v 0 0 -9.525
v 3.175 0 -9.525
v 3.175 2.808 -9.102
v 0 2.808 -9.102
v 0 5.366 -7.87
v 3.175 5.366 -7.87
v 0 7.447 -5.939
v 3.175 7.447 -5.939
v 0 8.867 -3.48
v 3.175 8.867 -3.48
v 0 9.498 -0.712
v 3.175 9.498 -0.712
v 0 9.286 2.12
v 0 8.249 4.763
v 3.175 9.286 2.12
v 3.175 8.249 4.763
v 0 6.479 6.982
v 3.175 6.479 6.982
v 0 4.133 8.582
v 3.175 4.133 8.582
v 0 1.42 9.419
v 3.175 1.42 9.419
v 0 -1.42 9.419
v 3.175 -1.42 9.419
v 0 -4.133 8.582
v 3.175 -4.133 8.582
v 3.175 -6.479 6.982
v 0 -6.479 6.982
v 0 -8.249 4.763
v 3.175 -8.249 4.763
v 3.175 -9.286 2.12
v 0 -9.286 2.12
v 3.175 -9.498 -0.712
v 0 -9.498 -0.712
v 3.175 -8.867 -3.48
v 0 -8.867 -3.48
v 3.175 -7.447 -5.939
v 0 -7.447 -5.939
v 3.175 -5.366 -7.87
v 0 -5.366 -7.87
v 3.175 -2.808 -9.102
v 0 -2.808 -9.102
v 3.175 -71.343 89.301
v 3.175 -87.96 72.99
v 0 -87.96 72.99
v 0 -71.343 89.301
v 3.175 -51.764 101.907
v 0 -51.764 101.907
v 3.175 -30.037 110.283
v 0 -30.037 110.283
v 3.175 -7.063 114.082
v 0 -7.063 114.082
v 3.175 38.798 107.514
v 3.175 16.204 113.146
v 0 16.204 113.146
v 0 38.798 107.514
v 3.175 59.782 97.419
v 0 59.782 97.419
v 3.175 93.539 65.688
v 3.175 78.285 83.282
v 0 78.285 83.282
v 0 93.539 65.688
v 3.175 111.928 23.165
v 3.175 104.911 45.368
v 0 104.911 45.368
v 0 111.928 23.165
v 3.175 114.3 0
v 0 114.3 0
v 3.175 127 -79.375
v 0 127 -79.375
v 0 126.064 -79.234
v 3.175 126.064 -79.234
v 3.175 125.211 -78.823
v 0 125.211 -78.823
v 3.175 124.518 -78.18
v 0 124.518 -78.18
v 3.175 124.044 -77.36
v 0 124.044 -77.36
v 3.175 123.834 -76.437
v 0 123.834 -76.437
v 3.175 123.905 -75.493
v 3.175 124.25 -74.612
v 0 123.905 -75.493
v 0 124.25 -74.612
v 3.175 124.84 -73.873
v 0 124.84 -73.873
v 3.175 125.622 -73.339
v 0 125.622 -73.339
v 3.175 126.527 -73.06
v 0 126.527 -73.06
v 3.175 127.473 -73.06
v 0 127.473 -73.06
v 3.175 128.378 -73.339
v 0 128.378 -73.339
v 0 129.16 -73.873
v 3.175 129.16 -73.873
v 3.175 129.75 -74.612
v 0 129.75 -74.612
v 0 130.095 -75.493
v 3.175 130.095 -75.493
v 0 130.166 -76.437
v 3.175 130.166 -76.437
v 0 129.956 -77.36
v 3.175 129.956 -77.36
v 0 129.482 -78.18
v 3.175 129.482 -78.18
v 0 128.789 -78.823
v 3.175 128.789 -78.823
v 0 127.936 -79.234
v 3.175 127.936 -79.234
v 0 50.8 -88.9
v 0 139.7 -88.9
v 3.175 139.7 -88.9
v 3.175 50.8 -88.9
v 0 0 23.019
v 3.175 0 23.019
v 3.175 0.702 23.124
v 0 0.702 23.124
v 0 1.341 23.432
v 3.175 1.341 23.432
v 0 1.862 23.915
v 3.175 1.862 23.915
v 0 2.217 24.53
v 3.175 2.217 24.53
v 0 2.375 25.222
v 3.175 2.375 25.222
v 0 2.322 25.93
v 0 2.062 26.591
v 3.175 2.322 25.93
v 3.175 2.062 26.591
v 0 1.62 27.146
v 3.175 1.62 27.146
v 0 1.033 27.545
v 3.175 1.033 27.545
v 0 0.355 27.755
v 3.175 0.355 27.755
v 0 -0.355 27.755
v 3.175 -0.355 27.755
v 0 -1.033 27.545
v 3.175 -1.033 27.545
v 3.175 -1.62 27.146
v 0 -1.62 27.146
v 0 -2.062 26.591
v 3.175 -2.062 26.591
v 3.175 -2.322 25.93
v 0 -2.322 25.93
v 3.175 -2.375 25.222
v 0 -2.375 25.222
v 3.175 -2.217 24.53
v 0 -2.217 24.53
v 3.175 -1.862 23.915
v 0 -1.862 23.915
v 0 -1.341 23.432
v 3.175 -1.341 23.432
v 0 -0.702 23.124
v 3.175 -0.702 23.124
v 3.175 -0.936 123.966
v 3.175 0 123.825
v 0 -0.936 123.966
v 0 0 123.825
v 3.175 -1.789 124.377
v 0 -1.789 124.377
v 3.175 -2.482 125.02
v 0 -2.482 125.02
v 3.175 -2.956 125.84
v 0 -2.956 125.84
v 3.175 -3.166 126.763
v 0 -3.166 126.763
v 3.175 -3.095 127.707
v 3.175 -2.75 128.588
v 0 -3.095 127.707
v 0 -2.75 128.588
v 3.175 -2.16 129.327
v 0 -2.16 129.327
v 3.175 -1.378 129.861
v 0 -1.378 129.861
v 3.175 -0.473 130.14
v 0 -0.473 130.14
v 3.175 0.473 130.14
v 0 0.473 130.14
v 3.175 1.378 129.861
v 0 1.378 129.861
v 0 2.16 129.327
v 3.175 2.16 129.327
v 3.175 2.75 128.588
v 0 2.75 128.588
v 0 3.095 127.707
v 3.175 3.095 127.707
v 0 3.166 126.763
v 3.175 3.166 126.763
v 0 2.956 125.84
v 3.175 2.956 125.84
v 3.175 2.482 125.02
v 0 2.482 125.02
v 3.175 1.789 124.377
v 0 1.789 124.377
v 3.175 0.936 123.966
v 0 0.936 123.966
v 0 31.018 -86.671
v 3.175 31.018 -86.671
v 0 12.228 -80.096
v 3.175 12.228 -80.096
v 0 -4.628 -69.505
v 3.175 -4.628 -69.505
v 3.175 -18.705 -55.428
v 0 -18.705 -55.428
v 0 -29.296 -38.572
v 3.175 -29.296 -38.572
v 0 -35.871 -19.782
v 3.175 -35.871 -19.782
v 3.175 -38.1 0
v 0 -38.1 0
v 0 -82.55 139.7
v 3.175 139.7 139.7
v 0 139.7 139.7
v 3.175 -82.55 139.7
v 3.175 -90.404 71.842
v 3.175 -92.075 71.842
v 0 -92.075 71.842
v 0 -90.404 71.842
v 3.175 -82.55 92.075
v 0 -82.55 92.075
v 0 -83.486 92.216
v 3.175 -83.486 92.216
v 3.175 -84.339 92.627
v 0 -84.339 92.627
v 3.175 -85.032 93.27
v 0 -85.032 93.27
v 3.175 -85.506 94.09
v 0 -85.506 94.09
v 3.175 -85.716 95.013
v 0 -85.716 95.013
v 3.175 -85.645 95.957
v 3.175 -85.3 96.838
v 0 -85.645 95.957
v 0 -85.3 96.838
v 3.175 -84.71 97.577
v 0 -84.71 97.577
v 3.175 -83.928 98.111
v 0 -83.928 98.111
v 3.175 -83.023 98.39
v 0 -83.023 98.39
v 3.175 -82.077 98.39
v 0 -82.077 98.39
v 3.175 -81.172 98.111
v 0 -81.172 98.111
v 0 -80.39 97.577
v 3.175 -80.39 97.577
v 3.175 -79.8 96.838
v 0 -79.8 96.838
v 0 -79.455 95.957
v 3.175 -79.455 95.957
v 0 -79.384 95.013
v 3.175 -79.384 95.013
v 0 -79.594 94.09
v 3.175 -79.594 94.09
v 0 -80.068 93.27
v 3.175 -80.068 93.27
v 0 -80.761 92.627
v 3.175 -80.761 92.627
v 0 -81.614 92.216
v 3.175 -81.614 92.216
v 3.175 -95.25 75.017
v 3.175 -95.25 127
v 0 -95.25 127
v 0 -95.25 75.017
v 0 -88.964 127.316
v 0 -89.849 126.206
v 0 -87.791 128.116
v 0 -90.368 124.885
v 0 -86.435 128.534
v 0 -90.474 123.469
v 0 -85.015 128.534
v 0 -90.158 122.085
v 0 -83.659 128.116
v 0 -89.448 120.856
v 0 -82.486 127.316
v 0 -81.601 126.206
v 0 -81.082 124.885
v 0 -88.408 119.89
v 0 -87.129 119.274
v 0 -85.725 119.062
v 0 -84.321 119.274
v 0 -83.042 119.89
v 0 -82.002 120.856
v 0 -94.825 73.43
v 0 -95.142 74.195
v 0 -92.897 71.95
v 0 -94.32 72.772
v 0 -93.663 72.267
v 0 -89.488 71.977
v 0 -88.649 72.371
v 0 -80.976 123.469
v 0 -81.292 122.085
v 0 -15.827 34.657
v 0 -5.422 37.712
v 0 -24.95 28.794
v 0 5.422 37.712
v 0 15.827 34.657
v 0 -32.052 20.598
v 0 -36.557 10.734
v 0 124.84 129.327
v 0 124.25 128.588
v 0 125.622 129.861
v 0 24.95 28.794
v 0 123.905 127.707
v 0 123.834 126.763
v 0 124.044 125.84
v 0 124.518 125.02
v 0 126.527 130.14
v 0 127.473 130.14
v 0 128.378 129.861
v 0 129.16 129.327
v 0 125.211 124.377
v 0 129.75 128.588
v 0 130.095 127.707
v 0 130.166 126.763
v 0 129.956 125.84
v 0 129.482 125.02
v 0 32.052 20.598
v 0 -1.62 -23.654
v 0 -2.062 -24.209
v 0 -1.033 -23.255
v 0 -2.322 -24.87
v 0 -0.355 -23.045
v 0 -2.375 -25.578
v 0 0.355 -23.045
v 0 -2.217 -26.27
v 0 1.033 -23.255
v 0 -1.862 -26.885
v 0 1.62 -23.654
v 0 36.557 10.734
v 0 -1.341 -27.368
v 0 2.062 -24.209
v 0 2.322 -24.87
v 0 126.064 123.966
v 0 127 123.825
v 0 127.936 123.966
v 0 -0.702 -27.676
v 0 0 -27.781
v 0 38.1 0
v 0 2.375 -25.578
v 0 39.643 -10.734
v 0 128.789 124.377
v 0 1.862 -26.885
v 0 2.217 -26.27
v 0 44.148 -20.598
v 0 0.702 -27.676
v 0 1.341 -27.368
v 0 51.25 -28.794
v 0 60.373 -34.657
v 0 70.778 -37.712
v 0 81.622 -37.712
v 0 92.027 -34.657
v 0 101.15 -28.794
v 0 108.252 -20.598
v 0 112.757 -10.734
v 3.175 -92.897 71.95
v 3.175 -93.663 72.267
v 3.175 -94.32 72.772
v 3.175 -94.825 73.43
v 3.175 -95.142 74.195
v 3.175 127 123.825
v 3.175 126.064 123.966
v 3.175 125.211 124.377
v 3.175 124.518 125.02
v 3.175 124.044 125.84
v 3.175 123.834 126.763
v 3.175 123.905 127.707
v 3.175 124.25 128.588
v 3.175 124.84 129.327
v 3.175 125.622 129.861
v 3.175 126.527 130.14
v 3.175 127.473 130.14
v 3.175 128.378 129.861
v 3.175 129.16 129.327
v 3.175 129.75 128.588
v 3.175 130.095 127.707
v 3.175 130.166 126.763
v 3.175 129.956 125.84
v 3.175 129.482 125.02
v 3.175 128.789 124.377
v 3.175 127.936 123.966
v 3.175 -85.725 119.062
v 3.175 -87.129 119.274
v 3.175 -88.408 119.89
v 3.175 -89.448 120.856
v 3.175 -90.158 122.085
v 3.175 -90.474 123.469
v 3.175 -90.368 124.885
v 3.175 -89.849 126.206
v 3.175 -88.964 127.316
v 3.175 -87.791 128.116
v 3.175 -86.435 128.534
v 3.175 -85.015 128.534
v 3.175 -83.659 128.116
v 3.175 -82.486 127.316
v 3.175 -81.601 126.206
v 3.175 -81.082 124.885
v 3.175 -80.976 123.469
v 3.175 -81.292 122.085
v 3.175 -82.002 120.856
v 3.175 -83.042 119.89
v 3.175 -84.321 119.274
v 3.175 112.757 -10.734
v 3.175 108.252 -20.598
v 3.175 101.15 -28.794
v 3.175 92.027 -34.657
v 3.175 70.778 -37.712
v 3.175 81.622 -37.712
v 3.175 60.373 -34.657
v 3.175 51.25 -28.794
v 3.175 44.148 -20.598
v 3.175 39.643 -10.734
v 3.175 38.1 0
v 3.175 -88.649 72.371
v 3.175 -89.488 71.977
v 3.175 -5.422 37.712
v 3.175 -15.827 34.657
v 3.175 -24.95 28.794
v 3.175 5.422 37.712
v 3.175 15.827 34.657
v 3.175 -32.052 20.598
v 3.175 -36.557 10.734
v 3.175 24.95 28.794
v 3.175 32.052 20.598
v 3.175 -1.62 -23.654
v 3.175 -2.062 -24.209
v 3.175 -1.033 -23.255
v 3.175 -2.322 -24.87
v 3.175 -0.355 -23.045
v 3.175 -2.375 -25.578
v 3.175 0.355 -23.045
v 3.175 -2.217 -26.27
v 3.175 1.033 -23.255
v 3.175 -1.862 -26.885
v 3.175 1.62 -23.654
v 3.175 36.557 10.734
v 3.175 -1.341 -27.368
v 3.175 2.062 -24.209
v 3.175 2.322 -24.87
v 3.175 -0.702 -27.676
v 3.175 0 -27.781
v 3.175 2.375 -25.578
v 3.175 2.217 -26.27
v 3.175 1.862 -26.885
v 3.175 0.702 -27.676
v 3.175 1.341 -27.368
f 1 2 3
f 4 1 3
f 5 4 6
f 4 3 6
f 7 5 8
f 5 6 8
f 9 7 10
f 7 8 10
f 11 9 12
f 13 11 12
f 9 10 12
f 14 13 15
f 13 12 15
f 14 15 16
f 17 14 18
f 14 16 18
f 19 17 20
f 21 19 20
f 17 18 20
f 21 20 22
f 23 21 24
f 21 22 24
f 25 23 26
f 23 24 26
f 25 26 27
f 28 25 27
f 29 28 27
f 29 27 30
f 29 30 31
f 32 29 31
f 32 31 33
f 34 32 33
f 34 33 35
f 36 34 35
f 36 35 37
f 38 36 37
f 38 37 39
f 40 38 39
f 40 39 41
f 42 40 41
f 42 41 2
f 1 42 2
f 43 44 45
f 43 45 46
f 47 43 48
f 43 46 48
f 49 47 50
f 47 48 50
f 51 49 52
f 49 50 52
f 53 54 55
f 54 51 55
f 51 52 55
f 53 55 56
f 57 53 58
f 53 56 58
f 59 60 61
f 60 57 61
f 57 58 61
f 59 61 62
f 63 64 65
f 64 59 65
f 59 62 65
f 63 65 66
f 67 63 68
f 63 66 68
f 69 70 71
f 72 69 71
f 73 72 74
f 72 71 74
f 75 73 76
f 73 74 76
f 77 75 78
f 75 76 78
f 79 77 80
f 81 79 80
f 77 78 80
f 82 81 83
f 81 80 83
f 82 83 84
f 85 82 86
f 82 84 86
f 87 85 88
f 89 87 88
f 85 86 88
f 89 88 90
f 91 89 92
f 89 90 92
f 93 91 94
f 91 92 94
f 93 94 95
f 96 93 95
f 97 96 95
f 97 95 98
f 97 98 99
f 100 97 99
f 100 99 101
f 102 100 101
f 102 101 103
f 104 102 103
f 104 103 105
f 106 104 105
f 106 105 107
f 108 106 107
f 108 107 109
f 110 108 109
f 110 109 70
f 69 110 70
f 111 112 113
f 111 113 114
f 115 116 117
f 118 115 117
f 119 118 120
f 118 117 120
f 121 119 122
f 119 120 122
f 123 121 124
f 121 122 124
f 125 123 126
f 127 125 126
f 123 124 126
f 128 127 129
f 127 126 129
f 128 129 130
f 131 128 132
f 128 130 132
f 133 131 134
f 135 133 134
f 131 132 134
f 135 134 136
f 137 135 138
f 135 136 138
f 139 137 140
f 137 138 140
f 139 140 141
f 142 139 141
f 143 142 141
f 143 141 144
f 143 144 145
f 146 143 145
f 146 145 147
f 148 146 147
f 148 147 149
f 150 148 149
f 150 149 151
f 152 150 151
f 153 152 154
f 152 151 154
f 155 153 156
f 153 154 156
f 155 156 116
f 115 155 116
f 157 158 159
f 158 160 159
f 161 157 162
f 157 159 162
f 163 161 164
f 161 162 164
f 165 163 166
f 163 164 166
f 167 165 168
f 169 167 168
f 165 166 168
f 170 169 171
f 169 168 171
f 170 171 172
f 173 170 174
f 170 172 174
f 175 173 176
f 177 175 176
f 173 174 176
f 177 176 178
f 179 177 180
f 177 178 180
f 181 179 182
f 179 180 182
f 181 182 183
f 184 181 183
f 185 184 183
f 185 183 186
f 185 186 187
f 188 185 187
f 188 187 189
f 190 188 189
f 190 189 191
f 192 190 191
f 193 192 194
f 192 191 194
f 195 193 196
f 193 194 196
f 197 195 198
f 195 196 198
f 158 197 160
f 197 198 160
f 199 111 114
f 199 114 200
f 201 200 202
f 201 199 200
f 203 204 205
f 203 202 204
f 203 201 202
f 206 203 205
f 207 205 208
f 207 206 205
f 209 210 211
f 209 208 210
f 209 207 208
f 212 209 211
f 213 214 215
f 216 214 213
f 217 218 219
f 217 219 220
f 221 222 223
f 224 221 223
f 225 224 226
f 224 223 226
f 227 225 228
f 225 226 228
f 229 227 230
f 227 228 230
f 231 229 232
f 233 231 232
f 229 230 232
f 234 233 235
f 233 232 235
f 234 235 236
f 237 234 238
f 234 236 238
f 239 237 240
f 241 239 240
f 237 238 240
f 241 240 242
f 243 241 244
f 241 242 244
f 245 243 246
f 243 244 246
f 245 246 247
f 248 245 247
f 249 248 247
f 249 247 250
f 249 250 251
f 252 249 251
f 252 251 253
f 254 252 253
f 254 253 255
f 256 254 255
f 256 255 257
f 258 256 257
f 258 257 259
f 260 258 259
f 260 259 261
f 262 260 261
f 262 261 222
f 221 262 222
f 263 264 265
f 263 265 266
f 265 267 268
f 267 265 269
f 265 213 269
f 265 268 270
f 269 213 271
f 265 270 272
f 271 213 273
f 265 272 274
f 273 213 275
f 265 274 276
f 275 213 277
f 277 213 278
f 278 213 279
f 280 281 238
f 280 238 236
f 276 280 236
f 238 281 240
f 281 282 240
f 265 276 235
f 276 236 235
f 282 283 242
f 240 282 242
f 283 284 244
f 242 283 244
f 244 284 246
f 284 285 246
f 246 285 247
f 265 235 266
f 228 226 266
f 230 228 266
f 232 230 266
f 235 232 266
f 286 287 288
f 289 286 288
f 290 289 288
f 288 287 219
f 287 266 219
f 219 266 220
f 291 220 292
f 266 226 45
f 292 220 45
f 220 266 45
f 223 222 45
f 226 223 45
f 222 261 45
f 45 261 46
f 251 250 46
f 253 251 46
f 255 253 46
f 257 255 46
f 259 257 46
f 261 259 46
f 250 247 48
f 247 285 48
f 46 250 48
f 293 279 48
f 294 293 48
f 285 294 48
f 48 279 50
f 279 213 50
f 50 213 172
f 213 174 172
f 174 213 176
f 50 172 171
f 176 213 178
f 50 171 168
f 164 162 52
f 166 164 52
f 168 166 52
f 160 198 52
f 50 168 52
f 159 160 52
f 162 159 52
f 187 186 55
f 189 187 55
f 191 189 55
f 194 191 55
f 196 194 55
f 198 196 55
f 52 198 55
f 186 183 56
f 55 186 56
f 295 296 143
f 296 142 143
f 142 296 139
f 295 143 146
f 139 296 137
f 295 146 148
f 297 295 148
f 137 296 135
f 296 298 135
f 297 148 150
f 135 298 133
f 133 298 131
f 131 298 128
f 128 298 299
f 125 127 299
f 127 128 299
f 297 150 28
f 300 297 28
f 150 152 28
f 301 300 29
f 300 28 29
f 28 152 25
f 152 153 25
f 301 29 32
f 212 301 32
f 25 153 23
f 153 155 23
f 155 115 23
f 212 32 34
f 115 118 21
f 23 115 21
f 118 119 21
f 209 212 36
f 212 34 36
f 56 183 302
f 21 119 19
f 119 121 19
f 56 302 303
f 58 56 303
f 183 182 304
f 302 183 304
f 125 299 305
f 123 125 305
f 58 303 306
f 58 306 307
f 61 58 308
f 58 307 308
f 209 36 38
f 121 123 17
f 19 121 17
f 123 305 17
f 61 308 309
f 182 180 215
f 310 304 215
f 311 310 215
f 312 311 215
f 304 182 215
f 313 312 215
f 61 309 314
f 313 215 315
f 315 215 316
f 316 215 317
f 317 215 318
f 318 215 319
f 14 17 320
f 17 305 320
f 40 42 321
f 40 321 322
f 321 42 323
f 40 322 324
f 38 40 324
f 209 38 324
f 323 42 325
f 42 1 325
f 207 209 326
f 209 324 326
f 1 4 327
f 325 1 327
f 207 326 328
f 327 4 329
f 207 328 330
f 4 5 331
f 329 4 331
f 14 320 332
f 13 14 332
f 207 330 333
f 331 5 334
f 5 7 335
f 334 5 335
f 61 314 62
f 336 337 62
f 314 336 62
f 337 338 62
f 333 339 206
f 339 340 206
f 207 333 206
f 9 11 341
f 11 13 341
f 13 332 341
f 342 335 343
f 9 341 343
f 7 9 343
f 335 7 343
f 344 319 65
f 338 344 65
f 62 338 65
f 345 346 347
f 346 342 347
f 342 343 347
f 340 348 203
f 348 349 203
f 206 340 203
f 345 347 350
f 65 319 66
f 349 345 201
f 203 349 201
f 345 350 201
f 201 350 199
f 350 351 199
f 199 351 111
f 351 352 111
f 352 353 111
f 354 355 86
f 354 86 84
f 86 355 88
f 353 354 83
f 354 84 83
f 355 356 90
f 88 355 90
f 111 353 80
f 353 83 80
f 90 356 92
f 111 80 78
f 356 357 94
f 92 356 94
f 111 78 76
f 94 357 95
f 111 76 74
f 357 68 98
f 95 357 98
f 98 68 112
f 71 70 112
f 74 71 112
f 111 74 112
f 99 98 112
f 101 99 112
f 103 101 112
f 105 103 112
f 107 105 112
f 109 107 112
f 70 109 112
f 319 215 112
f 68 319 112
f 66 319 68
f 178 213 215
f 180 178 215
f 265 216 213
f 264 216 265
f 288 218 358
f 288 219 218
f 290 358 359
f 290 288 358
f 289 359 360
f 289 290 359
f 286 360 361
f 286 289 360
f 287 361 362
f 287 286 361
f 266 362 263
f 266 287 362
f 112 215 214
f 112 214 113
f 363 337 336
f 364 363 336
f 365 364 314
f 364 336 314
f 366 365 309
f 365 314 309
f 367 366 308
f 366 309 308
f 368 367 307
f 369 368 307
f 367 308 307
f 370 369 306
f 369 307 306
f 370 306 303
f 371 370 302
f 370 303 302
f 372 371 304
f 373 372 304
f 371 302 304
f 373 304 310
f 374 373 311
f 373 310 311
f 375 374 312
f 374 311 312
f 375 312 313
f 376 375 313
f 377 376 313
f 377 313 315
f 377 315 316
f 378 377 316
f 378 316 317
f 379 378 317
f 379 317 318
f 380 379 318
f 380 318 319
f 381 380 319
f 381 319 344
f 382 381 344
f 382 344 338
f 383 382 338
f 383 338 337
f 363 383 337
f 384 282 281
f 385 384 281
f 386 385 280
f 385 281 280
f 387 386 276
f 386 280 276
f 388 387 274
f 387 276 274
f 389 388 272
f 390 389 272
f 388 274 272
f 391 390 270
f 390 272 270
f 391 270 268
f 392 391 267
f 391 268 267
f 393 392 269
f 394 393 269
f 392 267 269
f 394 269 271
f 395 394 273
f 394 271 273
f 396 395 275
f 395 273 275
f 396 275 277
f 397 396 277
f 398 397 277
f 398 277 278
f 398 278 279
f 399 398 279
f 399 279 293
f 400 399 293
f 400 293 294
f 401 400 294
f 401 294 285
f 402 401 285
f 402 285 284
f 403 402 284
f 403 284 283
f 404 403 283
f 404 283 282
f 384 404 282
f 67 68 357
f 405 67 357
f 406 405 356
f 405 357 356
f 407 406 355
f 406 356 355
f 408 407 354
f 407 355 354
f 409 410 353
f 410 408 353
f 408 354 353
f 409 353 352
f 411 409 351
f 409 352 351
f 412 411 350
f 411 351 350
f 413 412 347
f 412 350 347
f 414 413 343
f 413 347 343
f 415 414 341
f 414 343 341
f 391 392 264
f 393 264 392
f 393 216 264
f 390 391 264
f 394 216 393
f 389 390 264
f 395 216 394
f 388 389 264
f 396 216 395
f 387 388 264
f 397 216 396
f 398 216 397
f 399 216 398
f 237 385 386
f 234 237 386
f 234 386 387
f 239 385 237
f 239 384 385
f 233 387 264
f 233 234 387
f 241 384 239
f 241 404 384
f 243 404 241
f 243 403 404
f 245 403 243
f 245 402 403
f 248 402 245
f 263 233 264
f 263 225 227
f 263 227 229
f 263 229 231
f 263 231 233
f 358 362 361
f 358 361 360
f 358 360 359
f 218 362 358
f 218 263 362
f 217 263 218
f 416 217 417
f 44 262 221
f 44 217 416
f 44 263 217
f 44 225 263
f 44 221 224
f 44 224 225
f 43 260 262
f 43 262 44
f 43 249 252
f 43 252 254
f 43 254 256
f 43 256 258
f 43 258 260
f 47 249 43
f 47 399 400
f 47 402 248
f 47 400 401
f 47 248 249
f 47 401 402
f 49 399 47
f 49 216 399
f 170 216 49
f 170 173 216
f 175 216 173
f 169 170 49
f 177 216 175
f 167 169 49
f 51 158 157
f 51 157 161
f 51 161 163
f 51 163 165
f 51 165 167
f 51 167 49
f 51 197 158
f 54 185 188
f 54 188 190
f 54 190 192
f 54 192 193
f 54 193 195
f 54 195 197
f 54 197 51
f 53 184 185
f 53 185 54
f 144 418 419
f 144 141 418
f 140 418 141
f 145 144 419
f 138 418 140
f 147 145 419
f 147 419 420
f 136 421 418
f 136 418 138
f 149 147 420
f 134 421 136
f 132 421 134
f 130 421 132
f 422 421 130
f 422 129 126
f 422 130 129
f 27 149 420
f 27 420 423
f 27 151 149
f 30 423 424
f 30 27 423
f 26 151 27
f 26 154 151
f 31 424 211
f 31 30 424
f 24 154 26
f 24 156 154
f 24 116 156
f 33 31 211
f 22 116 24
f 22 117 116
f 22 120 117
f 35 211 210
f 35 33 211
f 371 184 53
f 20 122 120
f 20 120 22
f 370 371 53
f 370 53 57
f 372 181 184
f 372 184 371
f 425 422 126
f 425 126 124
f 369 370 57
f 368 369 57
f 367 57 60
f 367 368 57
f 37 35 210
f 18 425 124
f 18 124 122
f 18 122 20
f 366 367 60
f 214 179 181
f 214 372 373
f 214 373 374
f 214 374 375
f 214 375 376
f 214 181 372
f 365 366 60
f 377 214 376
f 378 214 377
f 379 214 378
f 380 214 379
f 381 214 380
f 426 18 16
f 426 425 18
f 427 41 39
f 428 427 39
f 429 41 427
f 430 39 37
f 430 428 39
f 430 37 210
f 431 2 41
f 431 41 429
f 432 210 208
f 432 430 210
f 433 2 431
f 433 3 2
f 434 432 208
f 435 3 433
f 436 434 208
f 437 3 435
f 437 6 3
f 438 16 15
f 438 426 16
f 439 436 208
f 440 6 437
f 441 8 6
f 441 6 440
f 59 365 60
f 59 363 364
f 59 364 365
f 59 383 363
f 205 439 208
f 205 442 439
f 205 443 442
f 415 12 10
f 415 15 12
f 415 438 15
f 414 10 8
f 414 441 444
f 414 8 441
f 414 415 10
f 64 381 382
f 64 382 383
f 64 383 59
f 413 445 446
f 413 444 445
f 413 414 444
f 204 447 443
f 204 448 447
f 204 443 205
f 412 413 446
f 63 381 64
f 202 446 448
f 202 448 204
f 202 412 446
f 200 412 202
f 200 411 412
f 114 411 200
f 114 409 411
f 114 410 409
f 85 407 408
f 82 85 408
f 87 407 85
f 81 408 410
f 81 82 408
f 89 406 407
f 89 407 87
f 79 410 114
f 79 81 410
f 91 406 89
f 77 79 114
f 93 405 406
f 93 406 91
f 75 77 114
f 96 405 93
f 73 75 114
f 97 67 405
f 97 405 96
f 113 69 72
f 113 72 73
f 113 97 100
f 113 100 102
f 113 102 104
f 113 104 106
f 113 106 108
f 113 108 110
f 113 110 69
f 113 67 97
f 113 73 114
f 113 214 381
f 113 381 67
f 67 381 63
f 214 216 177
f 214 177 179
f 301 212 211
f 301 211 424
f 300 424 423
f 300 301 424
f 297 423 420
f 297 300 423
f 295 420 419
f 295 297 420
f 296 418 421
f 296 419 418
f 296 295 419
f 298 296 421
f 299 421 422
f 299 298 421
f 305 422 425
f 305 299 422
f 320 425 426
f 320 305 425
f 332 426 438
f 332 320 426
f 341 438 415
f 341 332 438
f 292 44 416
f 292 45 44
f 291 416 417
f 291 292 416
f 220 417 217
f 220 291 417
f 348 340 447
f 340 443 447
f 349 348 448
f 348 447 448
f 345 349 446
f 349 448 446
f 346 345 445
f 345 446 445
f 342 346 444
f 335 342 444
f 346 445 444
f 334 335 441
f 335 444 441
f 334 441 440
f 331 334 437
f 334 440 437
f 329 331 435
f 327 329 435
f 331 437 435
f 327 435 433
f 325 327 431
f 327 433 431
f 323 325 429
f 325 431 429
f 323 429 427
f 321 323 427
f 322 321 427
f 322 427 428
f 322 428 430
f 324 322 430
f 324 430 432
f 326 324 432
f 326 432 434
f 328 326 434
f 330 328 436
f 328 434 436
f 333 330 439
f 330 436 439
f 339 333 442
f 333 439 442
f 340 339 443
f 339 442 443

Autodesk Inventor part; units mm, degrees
ref_plane "YZ Plane" through (0, 0, 0) normal (1, 0, 0) x (0, 1, 0)
ref_plane "XZ Plane" through (0, 0, 0) normal (0, 1, 0) x (-1, 0, 0)
ref_plane "XY Plane" through (0, 0, 0) normal (0, 0, 1) x (1, 0, 0)
sketch "Sketch1" plane through (0, 0, 0) normal (1, 0, 0) x (0, 1, 0)
  circle A0 centre (0, 0) radius 50.8 construction
  circle A1 centre (82.55, 0) radius 31.75 construction
  circle A2 centre (-82.55, 0) radius 31.75 construction
  circle A3 centre (0, 0) radius 114.3 construction
  circle A4 centre (0, 0) radius 38.1 construction
  arc A5 (38.1, 0) -> (114.3, 0) centre (76.2, 0) ccw construction
  arc A6 (-38.1, 0) -> (139.7, 0) centre (50.8, 0) ccw construction
  line L0 (50.8, -88.9) -> (139.7, -88.9) construction
  line L1 (139.7, -88.9) -> (139.7, 0) construction
  line L2 (139.7, 0) -> (-101.6, 0) construction
  line L3 (-101.6, 0) -> (-101.6, 139.7) construction
  line L4 (-101.6, 139.7) -> (139.7, 139.7) construction
  line L5 (139.7, 139.7) -> (139.7, 0) construction
  arc A7 (11.0716, 139.7) -> (-101.6, 96.52) centre (0, 0) ccw construction
  line L6 (-101.6, 139.7) -> (-101.6, 63.1817) construction
  line L7 (-101.6, 63.1817) -> (-95.25, 63.1817) construction
  arc A8 (-11.0716, 139.7) -> (-101.6, 96.52) centre (0, 0) ccw
  line L8 (-11.0716, 139.7) -> (139.7, 139.7)
  line L9 (139.7, 139.7) -> (139.7, -88.9)
  line L10 (139.7, -88.9) -> (50.8, -88.9)
  arc A9 (-38.1, 0) -> (50.8, -88.9) centre (50.8, 0) ccw
  arc A10 (38.1, 0) -> (-38.1, 0) centre (0, 0) ccw
  arc A11 (38.1, 0) -> (114.3, 0) centre (76.2, 0) ccw
  arc A12 (114.3, 0) -> (-95.25, 63.1817) centre (0, 0) ccw
  line L11 (-95.25, 63.1817) -> (-101.6, 63.1817)
  line L12 (-101.6, 96.52) -> (-101.6, 63.1817)
  dimension "d1" = 63.5
  dimension "d0" = 101.6
  dimension "d2" = 63.5
  dimension "d3" = 82.55
  dimension "d4" = 82.55
  dimension "d5" = 0
  dimension "d6" = 0
  dimension "d7" = 228.6
  dimension "d8" = 76.2
  dimension "d9" = 76.2
  dimension "d10" = 177.8
  dimension "d11" = 88.9
  dimension "d12" = 139.7
  dimension "d13" = 0
  dimension "d14" = 241.3
  dimension "d15" = 139.7
  dimension "d16" = 0
  dimension "d74" = 6.35
  dimension "d75" = 43.18
extrude "Extrusion1" add sketch "Sketch1" along normal blind 3.175
sketch "Sketch2" plane through (3.175, 0, 0) normal (1, 0, 0) x (0, 0, -1)
  arc A0 (0, 38.1) -> (0, -38.1) centre (0, 0) ccw projected
  arc A1 (0, -38.1) -> (88.9, 50.8) centre (0, 50.8) ccw projected
  line L0 (88.9, 50.8) -> (88.9, 139.7) projected
  line L1 (88.9, 139.7) -> (-139.7, 139.7) projected
  line L2 (-139.7, 139.7) -> (-139.7, -11.0716) projected
  arc A2 (-139.7, -11.0716) -> (-96.52, -101.6) centre (0, 0) ccw projected
  line L3 (-96.52, -101.6) -> (-63.1817, -101.6) projected
  line L4 (-63.1817, -101.6) -> (-63.1817, -95.25) projected
  arc A3 (0, 114.3) -> (-63.1817, -95.25) centre (0, 0) ccw projected
  arc A4 (0, 38.1) -> (0, 114.3) centre (0, 76.2) ccw projected
  line L5 (-63.1817, -101.6) -> (-139.3817, -101.6)
  line L6 (-139.3817, -101.6) -> (-139.3817, -95.25)
  line L7 (-139.3817, -95.25) -> (-63.1817, -95.25)
  line L8 (-63.1817, -95.25) -> (-63.1817, -101.6)
  arc A5 (0, 114.3) -> (-63.1817, -95.25) centre (0, 0) ccw projected
  line L9 (-63.1817, -101.6) -> (-71.842, -101.6)
  line L10 (-71.842, -101.6) -> (-71.842, -88.9)
  line L11 (-71.842, -88.9) -> (-63.1817, -88.9)
  line L12 (-63.1817, -88.9) -> (-63.1817, -101.6)
  point P0 (0, 0)
  dimension "d24" = 76.2
  dimension "d25" = 6.35
  dimension "d26" = 12.7
extrude "Extrusion2" cut sketch "Sketch2" against normal blind 3.175 contours L11 L12 A3 | A3 L7 L10 | L4 L3 L10 L7 | L10 L3 A2 L7 | A2 L5 L6 L7
sketch "Sketch3" plane through (3.175, 0, 0) normal (1, 0, 0) x (0, 0, -1)
  line L0 (-102.7916, -95.25) -> (-71.842, -95.25) projected
  line L1 (-71.842, -95.25) -> (-71.842, -88.9) projected
  arc A0 (0, 114.3) -> (-71.842, -88.9) centre (0, 0) ccw projected
  arc A1 (0, 38.1) -> (0, 114.3) centre (0, 76.2) ccw projected
  arc A2 (0, 38.1) -> (0, -38.1) centre (0, 0) ccw projected
  arc A3 (0, -38.1) -> (88.9, 50.8) centre (0, 50.8) ccw projected
  line L2 (88.9, 50.8) -> (88.9, 139.7) projected
  line L3 (88.9, 139.7) -> (-139.7, 139.7) projected
  line L4 (-139.7, 139.7) -> (-139.7, -11.0716) projected
  arc A4 (-139.7, -11.0716) -> (-102.7916, -95.25) centre (0, 0) ccw projected
  point P0 (0, 0)
  point P1 (-127, 127)
  point P2 (76.2, 127)
  point P3 (-95.25, -82.55)
  point P4 (-127, 0)
  dimension "d29" = 12.7
  dimension "d30" = 12.7
  dimension "d31" = 12.7
  dimension "d32" = 12.7
  dimension "d33" = 12.7
  dimension "d34" = 139.7
  dimension "d35" = 95.25
  dimension "d36" = 82.55
hole "Hole1" at (3.175, 127, 127) at (3.175, 127, -76.2) at (3.175, -82.55, 95.25) at (3.175, 0, 127) direction (-1, 0, 0) diameter 6.35 end through all
sketch "Sketch4" plane through (3.175, 0, 0) normal (1, 0, 0) x (0, 0, -1)
  circle A0 centre (-95.25, -82.55) radius 3.175 projected
  circle A1 centre (-127, 127) radius 3.175 projected
  circle A2 centre (76.2, 127) radius 3.175 projected
  circle A3 centre (-127, 0) radius 3.175 projected
  line L0 (-102.7916, -95.25) -> (-71.842, -95.25) projected
  line L1 (-71.842, -95.25) -> (-71.842, -88.9) projected
  arc A4 (0, 114.3) -> (-71.842, -88.9) centre (0, 0) ccw projected
  arc A5 (0, 38.1) -> (0, 114.3) centre (0, 76.2) ccw projected
  arc A6 (0, 38.1) -> (0, -38.1) centre (0, 0) ccw projected
  arc A7 (0, -38.1) -> (88.9, 50.8) centre (0, 50.8) ccw projected
  line L2 (88.9, 50.8) -> (88.9, 139.7) projected
  line L3 (88.9, 139.7) -> (-139.7, 139.7) projected
  line L4 (-139.7, 139.7) -> (-139.7, -11.0716) projected
  arc A8 (-139.7, -11.0716) -> (-102.7916, -95.25) centre (0, 0) ccw projected
  circle A9 centre (0, 0) radius 9.525
  circle A10 centre (-25.4, 0) radius 2.3813
  circle A11 centre (25.4, 0) radius 2.3813
  point P0 (0, 0)
  dimension "d44" = 0
  dimension "d45" = 0
  dimension "d46" = 25.4
  dimension "d47" = 25.4
  dimension "d55" = 19.05
  dimension "d56" = 4.7625
  dimension "d57" = 4.7625
extrude "Extrusion3" cut sketch "Sketch4" against normal blind 3.175 contours A9 | A10 | A11
sketch "Sketch5" plane through (3.175, 0, 0) normal (1, 0, 0) x (0, 0, -1)
  circle A0 centre (25.4, 0) radius 2.3813 projected
  circle A1 centre (-25.4, 0) radius 2.3813 projected
  circle A2 centre (0, 0) radius 9.525 projected
  circle A3 centre (-95.25, -82.55) radius 3.175 projected
  circle A4 centre (-127, 127) radius 3.175 projected
  circle A5 centre (76.2, 127) radius 3.175 projected
  circle A6 centre (-127, 0) radius 3.175 projected
  line L0 (-102.7916, -95.25) -> (-71.842, -95.25) projected
  line L1 (-71.842, -95.25) -> (-71.842, -88.9) projected
  arc A7 (0, 114.3) -> (-71.842, -88.9) centre (0, 0) ccw projected
  arc A8 (0, 38.1) -> (0, 114.3) centre (0, 76.2) ccw projected
  arc A9 (0, 38.1) -> (0, -38.1) centre (0, 0) ccw projected
  arc A10 (0, -38.1) -> (88.9, 50.8) centre (0, 50.8) ccw projected
  line L2 (88.9, 50.8) -> (88.9, 139.7) projected
  line L3 (88.9, 139.7) -> (-139.7, 139.7) projected
  line L4 (-139.7, 139.7) -> (-139.7, -11.0716) projected
  arc A11 (-139.7, -11.0716) -> (-102.7916, -95.25) centre (0, 0) ccw projected
  line L5 (-139.7, -11.0716) -> (-139.7, -95.25) construction
  line L6 (-139.7, -95.25) -> (-102.7916, -95.25) construction
  line L7 (-139.7, -95.25) -> (-127, -95.25) construction
  line L8 (-127, -95.25) -> (-127, -82.55) construction
  line L9 (-127, -82.55) -> (-139.7, -82.55) construction
  line L10 (-139.7, -82.55) -> (-139.7, -95.25) construction
  line L11 (-139.7, -11.0716) -> (-139.7, -82.55)
  line L12 (-139.7, -82.55) -> (-127, -95.25)
  line L13 (-127, -95.25) -> (-102.7916, -95.25)
  point P0 (0, 0)
  dimension "d60" = 12.7
  dimension "d61" = 12.7
extrude "Extrusion4" add sketch "Sketch5" against normal blind 3.175 contours L13 L12 L11 A11
sketch "Sketch6" plane through (3.175, 0, 0) normal (1, 0, 0) x (0, 0, -1)
  circle A0 centre (25.4, 0) radius 2.3813 projected
  circle A1 centre (-25.4, 0) radius 2.3813 projected
  circle A2 centre (0, 0) radius 9.525 projected
  circle A3 centre (-95.25, -82.55) radius 3.175 projected
  circle A4 centre (-127, 127) radius 3.175 projected
  circle A5 centre (76.2, 127) radius 3.175 projected
  circle A6 centre (-127, 0) radius 3.175 projected
  line L0 (-127, -95.25) -> (-71.842, -95.25) projected
  line L1 (-71.842, -95.25) -> (-71.842, -88.9) projected
  arc A7 (0, 114.3) -> (-71.842, -88.9) centre (0, 0) ccw projected
  arc A8 (0, 38.1) -> (0, 114.3) centre (0, 76.2) ccw projected
  arc A9 (0, 38.1) -> (0, -38.1) centre (0, 0) ccw projected
  arc A10 (0, -38.1) -> (88.9, 50.8) centre (0, 50.8) ccw projected
  line L2 (88.9, 50.8) -> (88.9, 139.7) projected
  line L3 (88.9, 139.7) -> (-139.7, 139.7) projected
  line L4 (-139.7, 139.7) -> (-139.7, -82.55) projected
  line L5 (-139.7, -82.55) -> (-127, -95.25) projected
  point P0 (0, 0)
  point P1 (-123.825, -85.725)
  dimension "d64" = 15.875
  dimension "d65" = 9.525
hole "Hole3" at (3.175, -85.725, 123.825) direction (-1, 0, 0) diameter 9.525 end through all
fillet "Fillet1" radius 3.175 2 edges at (1.5875, -95.25, 71.842) (1.5875, -88.9, 71.842)
properties part number "rail gearbox mounting" material "Aluminum 6061"
